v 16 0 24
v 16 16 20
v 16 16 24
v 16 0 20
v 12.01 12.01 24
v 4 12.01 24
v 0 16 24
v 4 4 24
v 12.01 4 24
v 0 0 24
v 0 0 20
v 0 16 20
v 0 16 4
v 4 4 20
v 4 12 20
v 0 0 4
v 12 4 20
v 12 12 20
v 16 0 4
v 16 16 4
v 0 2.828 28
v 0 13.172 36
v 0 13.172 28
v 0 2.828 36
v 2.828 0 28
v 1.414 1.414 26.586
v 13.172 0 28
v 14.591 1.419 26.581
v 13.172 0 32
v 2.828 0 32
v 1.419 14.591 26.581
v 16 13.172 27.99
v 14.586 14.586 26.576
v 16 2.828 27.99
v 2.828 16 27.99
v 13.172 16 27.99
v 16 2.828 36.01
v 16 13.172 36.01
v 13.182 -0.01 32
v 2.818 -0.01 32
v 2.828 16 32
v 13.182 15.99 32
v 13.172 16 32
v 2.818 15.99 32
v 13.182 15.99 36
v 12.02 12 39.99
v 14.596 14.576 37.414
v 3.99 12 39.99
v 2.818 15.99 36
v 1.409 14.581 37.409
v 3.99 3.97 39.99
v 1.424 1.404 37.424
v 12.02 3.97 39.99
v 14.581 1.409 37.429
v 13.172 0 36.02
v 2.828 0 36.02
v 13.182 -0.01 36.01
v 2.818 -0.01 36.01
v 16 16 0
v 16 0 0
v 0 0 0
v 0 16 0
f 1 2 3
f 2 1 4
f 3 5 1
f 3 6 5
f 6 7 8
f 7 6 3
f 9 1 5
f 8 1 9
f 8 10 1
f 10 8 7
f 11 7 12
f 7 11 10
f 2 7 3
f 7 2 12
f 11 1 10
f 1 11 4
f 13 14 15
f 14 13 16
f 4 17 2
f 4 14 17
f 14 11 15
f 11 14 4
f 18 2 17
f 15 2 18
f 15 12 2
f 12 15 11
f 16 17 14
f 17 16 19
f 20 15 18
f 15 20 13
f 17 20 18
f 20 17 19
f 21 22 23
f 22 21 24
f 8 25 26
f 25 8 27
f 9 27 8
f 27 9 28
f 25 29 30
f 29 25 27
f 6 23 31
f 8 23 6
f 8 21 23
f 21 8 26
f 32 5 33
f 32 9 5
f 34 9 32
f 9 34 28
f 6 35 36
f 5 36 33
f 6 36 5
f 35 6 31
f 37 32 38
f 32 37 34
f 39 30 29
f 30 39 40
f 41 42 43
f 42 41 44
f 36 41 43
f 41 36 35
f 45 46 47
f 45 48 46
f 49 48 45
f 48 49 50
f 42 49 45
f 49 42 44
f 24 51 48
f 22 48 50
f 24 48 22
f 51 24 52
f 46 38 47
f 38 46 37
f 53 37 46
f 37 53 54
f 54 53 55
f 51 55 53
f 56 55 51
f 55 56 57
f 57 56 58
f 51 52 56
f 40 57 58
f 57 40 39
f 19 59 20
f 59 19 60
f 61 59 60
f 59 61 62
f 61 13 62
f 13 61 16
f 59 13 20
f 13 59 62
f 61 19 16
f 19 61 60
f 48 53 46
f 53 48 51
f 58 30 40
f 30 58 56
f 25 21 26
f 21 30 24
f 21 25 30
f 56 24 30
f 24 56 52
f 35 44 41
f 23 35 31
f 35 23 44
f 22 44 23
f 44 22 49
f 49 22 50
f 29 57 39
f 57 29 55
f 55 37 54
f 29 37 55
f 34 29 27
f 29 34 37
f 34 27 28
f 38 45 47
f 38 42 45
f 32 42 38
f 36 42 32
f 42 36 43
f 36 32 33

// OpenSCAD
difference() {
union() {
translate([0,0,0]) {cube(size = [16,16,4], center = false);}
difference () {
translate([0,0,4]) {cube(size = [16,16,20], center = false);}

		translate([0,16,4]) {
		rotate([90,0,0]) 
		linear_extrude(height = 16, center = false, convexity = 10, twist = 0)
		polygon(points=[[0,0],[4,16],[0,16]],paths=[[0,1,2]]); 
	}

		translate([0,0,4]) {
		rotate([90,0,90]) 
		linear_extrude(height = 16, center = false, convexity = 10, twist = 0)
		polygon(points=[[0,0],[4,16],[0,16]],paths=[[0,1,2]]); 
	}
		translate([16,16,4]) {
		rotate([90,0,270]) 
		linear_extrude(height = 16, center = false, convexity = 10, twist = 0)
		polygon(points=[[0,0],[4,16],[0,16]],paths=[[0,1,2]]); 
	}
		translate([16,0,4]) {
		rotate([90,0,180]) 
		linear_extrude(height = 16, center = false, convexity = 10, twist = 0)
		polygon(points=[[0,0],[4,16],[0,16]],paths=[[0,1,2]]); 
	}



}



translate([0,0,20]) {cube(size = [16,16,4], center = false);}
union () {
translate([0,0,0]) {cube(size = [16,16,4], center = false);}
translate([0,0,24]) {
union () {
translate([0,15.99,16]) {
rotate([180,0,0])
difference() {cube(size = [16,16,8], center = false);

	union() {
	translate([0,0,0]) {	
	rotate([90,0,90]) 
		linear_extrude(height = 18, center = false, convexity = 10, twist = 0)
		polygon(points=[[0,0],[4,0],[0,4]],paths=[[0,1,2]]);
}

	translate([0,16.01,0]) {
		rotate([90,0,0]) 
		linear_extrude(height = 18, center = false, convexity = 10, twist = 0)
		polygon(points=[[0,0],[4,0],[0,4]],paths=[[0,1,2]]);
}
	translate([16.01,16,0]) {
		rotate([0,-90,90]) 
		linear_extrude(height = 18, center = false, convexity = 10, twist = 0)
		polygon(points=[[0,0],[4,0],[0,4]],paths=[[0,1,2]]);
}

	translate([0,16.01,0]) {
		rotate([90,-90,90]) 
		linear_extrude(height = 18, center = false, convexity = 10, twist = 0)
		polygon(points=[[0,0],[4,0],[0,4]],paths=[[0,1,2]]);
}
}
};
};
difference() {cube(size = [16,16,8], center = false);

	union() {
	translate([0,0,0]) {	
	rotate([90,0,90]) 
		linear_extrude(height = 18, center = false, convexity = 10, twist = 0)
		polygon(points=[[0,0],[4,0],[0,4]],paths=[[0,1,2]]);
}

	translate([0,16.01,0]) {
		rotate([90,0,0]) 
		linear_extrude(height = 18, center = false, convexity = 10, twist = 0)
		polygon(points=[[0,0],[4,0],[0,4]],paths=[[0,1,2]]);
}
	translate([16.01,16,0]) {
		rotate([0,-90,90]) 
		linear_extrude(height = 18, center = false, convexity = 10, twist = 0)
		polygon(points=[[0,0],[4,0],[0,4]],paths=[[0,1,2]]);
}

	translate([0,16.01,0]) {
		rotate([90,-90,90]) 
		linear_extrude(height = 18, center = false, convexity = 10, twist = 0)
		polygon(points=[[0,0],[4,0],[0,4]],paths=[[0,1,2]]);
}
}
};
}
}
}}
translate([-1,-2,39.5]) 
	{cube(size = [17,4,4], center = false);}
translate([0,0,39.99]) 
	{cube(size = [17,17,4], center = false);}
translate([0,0,32])
	rotate([0,0,45])
	{cube(size = [4,4,12], center = true);}
translate([0,16,32])
	rotate([0,0,45])
	{cube(size = [4,4,12], center = true);}
translate([16,0,32])
	rotate([0,0,45])
	{cube(size = [4,4,12], center = true);}
translate([16,16,32])
	rotate([0,0,45])
	{cube(size = [4,4,12], center = true);}
}
